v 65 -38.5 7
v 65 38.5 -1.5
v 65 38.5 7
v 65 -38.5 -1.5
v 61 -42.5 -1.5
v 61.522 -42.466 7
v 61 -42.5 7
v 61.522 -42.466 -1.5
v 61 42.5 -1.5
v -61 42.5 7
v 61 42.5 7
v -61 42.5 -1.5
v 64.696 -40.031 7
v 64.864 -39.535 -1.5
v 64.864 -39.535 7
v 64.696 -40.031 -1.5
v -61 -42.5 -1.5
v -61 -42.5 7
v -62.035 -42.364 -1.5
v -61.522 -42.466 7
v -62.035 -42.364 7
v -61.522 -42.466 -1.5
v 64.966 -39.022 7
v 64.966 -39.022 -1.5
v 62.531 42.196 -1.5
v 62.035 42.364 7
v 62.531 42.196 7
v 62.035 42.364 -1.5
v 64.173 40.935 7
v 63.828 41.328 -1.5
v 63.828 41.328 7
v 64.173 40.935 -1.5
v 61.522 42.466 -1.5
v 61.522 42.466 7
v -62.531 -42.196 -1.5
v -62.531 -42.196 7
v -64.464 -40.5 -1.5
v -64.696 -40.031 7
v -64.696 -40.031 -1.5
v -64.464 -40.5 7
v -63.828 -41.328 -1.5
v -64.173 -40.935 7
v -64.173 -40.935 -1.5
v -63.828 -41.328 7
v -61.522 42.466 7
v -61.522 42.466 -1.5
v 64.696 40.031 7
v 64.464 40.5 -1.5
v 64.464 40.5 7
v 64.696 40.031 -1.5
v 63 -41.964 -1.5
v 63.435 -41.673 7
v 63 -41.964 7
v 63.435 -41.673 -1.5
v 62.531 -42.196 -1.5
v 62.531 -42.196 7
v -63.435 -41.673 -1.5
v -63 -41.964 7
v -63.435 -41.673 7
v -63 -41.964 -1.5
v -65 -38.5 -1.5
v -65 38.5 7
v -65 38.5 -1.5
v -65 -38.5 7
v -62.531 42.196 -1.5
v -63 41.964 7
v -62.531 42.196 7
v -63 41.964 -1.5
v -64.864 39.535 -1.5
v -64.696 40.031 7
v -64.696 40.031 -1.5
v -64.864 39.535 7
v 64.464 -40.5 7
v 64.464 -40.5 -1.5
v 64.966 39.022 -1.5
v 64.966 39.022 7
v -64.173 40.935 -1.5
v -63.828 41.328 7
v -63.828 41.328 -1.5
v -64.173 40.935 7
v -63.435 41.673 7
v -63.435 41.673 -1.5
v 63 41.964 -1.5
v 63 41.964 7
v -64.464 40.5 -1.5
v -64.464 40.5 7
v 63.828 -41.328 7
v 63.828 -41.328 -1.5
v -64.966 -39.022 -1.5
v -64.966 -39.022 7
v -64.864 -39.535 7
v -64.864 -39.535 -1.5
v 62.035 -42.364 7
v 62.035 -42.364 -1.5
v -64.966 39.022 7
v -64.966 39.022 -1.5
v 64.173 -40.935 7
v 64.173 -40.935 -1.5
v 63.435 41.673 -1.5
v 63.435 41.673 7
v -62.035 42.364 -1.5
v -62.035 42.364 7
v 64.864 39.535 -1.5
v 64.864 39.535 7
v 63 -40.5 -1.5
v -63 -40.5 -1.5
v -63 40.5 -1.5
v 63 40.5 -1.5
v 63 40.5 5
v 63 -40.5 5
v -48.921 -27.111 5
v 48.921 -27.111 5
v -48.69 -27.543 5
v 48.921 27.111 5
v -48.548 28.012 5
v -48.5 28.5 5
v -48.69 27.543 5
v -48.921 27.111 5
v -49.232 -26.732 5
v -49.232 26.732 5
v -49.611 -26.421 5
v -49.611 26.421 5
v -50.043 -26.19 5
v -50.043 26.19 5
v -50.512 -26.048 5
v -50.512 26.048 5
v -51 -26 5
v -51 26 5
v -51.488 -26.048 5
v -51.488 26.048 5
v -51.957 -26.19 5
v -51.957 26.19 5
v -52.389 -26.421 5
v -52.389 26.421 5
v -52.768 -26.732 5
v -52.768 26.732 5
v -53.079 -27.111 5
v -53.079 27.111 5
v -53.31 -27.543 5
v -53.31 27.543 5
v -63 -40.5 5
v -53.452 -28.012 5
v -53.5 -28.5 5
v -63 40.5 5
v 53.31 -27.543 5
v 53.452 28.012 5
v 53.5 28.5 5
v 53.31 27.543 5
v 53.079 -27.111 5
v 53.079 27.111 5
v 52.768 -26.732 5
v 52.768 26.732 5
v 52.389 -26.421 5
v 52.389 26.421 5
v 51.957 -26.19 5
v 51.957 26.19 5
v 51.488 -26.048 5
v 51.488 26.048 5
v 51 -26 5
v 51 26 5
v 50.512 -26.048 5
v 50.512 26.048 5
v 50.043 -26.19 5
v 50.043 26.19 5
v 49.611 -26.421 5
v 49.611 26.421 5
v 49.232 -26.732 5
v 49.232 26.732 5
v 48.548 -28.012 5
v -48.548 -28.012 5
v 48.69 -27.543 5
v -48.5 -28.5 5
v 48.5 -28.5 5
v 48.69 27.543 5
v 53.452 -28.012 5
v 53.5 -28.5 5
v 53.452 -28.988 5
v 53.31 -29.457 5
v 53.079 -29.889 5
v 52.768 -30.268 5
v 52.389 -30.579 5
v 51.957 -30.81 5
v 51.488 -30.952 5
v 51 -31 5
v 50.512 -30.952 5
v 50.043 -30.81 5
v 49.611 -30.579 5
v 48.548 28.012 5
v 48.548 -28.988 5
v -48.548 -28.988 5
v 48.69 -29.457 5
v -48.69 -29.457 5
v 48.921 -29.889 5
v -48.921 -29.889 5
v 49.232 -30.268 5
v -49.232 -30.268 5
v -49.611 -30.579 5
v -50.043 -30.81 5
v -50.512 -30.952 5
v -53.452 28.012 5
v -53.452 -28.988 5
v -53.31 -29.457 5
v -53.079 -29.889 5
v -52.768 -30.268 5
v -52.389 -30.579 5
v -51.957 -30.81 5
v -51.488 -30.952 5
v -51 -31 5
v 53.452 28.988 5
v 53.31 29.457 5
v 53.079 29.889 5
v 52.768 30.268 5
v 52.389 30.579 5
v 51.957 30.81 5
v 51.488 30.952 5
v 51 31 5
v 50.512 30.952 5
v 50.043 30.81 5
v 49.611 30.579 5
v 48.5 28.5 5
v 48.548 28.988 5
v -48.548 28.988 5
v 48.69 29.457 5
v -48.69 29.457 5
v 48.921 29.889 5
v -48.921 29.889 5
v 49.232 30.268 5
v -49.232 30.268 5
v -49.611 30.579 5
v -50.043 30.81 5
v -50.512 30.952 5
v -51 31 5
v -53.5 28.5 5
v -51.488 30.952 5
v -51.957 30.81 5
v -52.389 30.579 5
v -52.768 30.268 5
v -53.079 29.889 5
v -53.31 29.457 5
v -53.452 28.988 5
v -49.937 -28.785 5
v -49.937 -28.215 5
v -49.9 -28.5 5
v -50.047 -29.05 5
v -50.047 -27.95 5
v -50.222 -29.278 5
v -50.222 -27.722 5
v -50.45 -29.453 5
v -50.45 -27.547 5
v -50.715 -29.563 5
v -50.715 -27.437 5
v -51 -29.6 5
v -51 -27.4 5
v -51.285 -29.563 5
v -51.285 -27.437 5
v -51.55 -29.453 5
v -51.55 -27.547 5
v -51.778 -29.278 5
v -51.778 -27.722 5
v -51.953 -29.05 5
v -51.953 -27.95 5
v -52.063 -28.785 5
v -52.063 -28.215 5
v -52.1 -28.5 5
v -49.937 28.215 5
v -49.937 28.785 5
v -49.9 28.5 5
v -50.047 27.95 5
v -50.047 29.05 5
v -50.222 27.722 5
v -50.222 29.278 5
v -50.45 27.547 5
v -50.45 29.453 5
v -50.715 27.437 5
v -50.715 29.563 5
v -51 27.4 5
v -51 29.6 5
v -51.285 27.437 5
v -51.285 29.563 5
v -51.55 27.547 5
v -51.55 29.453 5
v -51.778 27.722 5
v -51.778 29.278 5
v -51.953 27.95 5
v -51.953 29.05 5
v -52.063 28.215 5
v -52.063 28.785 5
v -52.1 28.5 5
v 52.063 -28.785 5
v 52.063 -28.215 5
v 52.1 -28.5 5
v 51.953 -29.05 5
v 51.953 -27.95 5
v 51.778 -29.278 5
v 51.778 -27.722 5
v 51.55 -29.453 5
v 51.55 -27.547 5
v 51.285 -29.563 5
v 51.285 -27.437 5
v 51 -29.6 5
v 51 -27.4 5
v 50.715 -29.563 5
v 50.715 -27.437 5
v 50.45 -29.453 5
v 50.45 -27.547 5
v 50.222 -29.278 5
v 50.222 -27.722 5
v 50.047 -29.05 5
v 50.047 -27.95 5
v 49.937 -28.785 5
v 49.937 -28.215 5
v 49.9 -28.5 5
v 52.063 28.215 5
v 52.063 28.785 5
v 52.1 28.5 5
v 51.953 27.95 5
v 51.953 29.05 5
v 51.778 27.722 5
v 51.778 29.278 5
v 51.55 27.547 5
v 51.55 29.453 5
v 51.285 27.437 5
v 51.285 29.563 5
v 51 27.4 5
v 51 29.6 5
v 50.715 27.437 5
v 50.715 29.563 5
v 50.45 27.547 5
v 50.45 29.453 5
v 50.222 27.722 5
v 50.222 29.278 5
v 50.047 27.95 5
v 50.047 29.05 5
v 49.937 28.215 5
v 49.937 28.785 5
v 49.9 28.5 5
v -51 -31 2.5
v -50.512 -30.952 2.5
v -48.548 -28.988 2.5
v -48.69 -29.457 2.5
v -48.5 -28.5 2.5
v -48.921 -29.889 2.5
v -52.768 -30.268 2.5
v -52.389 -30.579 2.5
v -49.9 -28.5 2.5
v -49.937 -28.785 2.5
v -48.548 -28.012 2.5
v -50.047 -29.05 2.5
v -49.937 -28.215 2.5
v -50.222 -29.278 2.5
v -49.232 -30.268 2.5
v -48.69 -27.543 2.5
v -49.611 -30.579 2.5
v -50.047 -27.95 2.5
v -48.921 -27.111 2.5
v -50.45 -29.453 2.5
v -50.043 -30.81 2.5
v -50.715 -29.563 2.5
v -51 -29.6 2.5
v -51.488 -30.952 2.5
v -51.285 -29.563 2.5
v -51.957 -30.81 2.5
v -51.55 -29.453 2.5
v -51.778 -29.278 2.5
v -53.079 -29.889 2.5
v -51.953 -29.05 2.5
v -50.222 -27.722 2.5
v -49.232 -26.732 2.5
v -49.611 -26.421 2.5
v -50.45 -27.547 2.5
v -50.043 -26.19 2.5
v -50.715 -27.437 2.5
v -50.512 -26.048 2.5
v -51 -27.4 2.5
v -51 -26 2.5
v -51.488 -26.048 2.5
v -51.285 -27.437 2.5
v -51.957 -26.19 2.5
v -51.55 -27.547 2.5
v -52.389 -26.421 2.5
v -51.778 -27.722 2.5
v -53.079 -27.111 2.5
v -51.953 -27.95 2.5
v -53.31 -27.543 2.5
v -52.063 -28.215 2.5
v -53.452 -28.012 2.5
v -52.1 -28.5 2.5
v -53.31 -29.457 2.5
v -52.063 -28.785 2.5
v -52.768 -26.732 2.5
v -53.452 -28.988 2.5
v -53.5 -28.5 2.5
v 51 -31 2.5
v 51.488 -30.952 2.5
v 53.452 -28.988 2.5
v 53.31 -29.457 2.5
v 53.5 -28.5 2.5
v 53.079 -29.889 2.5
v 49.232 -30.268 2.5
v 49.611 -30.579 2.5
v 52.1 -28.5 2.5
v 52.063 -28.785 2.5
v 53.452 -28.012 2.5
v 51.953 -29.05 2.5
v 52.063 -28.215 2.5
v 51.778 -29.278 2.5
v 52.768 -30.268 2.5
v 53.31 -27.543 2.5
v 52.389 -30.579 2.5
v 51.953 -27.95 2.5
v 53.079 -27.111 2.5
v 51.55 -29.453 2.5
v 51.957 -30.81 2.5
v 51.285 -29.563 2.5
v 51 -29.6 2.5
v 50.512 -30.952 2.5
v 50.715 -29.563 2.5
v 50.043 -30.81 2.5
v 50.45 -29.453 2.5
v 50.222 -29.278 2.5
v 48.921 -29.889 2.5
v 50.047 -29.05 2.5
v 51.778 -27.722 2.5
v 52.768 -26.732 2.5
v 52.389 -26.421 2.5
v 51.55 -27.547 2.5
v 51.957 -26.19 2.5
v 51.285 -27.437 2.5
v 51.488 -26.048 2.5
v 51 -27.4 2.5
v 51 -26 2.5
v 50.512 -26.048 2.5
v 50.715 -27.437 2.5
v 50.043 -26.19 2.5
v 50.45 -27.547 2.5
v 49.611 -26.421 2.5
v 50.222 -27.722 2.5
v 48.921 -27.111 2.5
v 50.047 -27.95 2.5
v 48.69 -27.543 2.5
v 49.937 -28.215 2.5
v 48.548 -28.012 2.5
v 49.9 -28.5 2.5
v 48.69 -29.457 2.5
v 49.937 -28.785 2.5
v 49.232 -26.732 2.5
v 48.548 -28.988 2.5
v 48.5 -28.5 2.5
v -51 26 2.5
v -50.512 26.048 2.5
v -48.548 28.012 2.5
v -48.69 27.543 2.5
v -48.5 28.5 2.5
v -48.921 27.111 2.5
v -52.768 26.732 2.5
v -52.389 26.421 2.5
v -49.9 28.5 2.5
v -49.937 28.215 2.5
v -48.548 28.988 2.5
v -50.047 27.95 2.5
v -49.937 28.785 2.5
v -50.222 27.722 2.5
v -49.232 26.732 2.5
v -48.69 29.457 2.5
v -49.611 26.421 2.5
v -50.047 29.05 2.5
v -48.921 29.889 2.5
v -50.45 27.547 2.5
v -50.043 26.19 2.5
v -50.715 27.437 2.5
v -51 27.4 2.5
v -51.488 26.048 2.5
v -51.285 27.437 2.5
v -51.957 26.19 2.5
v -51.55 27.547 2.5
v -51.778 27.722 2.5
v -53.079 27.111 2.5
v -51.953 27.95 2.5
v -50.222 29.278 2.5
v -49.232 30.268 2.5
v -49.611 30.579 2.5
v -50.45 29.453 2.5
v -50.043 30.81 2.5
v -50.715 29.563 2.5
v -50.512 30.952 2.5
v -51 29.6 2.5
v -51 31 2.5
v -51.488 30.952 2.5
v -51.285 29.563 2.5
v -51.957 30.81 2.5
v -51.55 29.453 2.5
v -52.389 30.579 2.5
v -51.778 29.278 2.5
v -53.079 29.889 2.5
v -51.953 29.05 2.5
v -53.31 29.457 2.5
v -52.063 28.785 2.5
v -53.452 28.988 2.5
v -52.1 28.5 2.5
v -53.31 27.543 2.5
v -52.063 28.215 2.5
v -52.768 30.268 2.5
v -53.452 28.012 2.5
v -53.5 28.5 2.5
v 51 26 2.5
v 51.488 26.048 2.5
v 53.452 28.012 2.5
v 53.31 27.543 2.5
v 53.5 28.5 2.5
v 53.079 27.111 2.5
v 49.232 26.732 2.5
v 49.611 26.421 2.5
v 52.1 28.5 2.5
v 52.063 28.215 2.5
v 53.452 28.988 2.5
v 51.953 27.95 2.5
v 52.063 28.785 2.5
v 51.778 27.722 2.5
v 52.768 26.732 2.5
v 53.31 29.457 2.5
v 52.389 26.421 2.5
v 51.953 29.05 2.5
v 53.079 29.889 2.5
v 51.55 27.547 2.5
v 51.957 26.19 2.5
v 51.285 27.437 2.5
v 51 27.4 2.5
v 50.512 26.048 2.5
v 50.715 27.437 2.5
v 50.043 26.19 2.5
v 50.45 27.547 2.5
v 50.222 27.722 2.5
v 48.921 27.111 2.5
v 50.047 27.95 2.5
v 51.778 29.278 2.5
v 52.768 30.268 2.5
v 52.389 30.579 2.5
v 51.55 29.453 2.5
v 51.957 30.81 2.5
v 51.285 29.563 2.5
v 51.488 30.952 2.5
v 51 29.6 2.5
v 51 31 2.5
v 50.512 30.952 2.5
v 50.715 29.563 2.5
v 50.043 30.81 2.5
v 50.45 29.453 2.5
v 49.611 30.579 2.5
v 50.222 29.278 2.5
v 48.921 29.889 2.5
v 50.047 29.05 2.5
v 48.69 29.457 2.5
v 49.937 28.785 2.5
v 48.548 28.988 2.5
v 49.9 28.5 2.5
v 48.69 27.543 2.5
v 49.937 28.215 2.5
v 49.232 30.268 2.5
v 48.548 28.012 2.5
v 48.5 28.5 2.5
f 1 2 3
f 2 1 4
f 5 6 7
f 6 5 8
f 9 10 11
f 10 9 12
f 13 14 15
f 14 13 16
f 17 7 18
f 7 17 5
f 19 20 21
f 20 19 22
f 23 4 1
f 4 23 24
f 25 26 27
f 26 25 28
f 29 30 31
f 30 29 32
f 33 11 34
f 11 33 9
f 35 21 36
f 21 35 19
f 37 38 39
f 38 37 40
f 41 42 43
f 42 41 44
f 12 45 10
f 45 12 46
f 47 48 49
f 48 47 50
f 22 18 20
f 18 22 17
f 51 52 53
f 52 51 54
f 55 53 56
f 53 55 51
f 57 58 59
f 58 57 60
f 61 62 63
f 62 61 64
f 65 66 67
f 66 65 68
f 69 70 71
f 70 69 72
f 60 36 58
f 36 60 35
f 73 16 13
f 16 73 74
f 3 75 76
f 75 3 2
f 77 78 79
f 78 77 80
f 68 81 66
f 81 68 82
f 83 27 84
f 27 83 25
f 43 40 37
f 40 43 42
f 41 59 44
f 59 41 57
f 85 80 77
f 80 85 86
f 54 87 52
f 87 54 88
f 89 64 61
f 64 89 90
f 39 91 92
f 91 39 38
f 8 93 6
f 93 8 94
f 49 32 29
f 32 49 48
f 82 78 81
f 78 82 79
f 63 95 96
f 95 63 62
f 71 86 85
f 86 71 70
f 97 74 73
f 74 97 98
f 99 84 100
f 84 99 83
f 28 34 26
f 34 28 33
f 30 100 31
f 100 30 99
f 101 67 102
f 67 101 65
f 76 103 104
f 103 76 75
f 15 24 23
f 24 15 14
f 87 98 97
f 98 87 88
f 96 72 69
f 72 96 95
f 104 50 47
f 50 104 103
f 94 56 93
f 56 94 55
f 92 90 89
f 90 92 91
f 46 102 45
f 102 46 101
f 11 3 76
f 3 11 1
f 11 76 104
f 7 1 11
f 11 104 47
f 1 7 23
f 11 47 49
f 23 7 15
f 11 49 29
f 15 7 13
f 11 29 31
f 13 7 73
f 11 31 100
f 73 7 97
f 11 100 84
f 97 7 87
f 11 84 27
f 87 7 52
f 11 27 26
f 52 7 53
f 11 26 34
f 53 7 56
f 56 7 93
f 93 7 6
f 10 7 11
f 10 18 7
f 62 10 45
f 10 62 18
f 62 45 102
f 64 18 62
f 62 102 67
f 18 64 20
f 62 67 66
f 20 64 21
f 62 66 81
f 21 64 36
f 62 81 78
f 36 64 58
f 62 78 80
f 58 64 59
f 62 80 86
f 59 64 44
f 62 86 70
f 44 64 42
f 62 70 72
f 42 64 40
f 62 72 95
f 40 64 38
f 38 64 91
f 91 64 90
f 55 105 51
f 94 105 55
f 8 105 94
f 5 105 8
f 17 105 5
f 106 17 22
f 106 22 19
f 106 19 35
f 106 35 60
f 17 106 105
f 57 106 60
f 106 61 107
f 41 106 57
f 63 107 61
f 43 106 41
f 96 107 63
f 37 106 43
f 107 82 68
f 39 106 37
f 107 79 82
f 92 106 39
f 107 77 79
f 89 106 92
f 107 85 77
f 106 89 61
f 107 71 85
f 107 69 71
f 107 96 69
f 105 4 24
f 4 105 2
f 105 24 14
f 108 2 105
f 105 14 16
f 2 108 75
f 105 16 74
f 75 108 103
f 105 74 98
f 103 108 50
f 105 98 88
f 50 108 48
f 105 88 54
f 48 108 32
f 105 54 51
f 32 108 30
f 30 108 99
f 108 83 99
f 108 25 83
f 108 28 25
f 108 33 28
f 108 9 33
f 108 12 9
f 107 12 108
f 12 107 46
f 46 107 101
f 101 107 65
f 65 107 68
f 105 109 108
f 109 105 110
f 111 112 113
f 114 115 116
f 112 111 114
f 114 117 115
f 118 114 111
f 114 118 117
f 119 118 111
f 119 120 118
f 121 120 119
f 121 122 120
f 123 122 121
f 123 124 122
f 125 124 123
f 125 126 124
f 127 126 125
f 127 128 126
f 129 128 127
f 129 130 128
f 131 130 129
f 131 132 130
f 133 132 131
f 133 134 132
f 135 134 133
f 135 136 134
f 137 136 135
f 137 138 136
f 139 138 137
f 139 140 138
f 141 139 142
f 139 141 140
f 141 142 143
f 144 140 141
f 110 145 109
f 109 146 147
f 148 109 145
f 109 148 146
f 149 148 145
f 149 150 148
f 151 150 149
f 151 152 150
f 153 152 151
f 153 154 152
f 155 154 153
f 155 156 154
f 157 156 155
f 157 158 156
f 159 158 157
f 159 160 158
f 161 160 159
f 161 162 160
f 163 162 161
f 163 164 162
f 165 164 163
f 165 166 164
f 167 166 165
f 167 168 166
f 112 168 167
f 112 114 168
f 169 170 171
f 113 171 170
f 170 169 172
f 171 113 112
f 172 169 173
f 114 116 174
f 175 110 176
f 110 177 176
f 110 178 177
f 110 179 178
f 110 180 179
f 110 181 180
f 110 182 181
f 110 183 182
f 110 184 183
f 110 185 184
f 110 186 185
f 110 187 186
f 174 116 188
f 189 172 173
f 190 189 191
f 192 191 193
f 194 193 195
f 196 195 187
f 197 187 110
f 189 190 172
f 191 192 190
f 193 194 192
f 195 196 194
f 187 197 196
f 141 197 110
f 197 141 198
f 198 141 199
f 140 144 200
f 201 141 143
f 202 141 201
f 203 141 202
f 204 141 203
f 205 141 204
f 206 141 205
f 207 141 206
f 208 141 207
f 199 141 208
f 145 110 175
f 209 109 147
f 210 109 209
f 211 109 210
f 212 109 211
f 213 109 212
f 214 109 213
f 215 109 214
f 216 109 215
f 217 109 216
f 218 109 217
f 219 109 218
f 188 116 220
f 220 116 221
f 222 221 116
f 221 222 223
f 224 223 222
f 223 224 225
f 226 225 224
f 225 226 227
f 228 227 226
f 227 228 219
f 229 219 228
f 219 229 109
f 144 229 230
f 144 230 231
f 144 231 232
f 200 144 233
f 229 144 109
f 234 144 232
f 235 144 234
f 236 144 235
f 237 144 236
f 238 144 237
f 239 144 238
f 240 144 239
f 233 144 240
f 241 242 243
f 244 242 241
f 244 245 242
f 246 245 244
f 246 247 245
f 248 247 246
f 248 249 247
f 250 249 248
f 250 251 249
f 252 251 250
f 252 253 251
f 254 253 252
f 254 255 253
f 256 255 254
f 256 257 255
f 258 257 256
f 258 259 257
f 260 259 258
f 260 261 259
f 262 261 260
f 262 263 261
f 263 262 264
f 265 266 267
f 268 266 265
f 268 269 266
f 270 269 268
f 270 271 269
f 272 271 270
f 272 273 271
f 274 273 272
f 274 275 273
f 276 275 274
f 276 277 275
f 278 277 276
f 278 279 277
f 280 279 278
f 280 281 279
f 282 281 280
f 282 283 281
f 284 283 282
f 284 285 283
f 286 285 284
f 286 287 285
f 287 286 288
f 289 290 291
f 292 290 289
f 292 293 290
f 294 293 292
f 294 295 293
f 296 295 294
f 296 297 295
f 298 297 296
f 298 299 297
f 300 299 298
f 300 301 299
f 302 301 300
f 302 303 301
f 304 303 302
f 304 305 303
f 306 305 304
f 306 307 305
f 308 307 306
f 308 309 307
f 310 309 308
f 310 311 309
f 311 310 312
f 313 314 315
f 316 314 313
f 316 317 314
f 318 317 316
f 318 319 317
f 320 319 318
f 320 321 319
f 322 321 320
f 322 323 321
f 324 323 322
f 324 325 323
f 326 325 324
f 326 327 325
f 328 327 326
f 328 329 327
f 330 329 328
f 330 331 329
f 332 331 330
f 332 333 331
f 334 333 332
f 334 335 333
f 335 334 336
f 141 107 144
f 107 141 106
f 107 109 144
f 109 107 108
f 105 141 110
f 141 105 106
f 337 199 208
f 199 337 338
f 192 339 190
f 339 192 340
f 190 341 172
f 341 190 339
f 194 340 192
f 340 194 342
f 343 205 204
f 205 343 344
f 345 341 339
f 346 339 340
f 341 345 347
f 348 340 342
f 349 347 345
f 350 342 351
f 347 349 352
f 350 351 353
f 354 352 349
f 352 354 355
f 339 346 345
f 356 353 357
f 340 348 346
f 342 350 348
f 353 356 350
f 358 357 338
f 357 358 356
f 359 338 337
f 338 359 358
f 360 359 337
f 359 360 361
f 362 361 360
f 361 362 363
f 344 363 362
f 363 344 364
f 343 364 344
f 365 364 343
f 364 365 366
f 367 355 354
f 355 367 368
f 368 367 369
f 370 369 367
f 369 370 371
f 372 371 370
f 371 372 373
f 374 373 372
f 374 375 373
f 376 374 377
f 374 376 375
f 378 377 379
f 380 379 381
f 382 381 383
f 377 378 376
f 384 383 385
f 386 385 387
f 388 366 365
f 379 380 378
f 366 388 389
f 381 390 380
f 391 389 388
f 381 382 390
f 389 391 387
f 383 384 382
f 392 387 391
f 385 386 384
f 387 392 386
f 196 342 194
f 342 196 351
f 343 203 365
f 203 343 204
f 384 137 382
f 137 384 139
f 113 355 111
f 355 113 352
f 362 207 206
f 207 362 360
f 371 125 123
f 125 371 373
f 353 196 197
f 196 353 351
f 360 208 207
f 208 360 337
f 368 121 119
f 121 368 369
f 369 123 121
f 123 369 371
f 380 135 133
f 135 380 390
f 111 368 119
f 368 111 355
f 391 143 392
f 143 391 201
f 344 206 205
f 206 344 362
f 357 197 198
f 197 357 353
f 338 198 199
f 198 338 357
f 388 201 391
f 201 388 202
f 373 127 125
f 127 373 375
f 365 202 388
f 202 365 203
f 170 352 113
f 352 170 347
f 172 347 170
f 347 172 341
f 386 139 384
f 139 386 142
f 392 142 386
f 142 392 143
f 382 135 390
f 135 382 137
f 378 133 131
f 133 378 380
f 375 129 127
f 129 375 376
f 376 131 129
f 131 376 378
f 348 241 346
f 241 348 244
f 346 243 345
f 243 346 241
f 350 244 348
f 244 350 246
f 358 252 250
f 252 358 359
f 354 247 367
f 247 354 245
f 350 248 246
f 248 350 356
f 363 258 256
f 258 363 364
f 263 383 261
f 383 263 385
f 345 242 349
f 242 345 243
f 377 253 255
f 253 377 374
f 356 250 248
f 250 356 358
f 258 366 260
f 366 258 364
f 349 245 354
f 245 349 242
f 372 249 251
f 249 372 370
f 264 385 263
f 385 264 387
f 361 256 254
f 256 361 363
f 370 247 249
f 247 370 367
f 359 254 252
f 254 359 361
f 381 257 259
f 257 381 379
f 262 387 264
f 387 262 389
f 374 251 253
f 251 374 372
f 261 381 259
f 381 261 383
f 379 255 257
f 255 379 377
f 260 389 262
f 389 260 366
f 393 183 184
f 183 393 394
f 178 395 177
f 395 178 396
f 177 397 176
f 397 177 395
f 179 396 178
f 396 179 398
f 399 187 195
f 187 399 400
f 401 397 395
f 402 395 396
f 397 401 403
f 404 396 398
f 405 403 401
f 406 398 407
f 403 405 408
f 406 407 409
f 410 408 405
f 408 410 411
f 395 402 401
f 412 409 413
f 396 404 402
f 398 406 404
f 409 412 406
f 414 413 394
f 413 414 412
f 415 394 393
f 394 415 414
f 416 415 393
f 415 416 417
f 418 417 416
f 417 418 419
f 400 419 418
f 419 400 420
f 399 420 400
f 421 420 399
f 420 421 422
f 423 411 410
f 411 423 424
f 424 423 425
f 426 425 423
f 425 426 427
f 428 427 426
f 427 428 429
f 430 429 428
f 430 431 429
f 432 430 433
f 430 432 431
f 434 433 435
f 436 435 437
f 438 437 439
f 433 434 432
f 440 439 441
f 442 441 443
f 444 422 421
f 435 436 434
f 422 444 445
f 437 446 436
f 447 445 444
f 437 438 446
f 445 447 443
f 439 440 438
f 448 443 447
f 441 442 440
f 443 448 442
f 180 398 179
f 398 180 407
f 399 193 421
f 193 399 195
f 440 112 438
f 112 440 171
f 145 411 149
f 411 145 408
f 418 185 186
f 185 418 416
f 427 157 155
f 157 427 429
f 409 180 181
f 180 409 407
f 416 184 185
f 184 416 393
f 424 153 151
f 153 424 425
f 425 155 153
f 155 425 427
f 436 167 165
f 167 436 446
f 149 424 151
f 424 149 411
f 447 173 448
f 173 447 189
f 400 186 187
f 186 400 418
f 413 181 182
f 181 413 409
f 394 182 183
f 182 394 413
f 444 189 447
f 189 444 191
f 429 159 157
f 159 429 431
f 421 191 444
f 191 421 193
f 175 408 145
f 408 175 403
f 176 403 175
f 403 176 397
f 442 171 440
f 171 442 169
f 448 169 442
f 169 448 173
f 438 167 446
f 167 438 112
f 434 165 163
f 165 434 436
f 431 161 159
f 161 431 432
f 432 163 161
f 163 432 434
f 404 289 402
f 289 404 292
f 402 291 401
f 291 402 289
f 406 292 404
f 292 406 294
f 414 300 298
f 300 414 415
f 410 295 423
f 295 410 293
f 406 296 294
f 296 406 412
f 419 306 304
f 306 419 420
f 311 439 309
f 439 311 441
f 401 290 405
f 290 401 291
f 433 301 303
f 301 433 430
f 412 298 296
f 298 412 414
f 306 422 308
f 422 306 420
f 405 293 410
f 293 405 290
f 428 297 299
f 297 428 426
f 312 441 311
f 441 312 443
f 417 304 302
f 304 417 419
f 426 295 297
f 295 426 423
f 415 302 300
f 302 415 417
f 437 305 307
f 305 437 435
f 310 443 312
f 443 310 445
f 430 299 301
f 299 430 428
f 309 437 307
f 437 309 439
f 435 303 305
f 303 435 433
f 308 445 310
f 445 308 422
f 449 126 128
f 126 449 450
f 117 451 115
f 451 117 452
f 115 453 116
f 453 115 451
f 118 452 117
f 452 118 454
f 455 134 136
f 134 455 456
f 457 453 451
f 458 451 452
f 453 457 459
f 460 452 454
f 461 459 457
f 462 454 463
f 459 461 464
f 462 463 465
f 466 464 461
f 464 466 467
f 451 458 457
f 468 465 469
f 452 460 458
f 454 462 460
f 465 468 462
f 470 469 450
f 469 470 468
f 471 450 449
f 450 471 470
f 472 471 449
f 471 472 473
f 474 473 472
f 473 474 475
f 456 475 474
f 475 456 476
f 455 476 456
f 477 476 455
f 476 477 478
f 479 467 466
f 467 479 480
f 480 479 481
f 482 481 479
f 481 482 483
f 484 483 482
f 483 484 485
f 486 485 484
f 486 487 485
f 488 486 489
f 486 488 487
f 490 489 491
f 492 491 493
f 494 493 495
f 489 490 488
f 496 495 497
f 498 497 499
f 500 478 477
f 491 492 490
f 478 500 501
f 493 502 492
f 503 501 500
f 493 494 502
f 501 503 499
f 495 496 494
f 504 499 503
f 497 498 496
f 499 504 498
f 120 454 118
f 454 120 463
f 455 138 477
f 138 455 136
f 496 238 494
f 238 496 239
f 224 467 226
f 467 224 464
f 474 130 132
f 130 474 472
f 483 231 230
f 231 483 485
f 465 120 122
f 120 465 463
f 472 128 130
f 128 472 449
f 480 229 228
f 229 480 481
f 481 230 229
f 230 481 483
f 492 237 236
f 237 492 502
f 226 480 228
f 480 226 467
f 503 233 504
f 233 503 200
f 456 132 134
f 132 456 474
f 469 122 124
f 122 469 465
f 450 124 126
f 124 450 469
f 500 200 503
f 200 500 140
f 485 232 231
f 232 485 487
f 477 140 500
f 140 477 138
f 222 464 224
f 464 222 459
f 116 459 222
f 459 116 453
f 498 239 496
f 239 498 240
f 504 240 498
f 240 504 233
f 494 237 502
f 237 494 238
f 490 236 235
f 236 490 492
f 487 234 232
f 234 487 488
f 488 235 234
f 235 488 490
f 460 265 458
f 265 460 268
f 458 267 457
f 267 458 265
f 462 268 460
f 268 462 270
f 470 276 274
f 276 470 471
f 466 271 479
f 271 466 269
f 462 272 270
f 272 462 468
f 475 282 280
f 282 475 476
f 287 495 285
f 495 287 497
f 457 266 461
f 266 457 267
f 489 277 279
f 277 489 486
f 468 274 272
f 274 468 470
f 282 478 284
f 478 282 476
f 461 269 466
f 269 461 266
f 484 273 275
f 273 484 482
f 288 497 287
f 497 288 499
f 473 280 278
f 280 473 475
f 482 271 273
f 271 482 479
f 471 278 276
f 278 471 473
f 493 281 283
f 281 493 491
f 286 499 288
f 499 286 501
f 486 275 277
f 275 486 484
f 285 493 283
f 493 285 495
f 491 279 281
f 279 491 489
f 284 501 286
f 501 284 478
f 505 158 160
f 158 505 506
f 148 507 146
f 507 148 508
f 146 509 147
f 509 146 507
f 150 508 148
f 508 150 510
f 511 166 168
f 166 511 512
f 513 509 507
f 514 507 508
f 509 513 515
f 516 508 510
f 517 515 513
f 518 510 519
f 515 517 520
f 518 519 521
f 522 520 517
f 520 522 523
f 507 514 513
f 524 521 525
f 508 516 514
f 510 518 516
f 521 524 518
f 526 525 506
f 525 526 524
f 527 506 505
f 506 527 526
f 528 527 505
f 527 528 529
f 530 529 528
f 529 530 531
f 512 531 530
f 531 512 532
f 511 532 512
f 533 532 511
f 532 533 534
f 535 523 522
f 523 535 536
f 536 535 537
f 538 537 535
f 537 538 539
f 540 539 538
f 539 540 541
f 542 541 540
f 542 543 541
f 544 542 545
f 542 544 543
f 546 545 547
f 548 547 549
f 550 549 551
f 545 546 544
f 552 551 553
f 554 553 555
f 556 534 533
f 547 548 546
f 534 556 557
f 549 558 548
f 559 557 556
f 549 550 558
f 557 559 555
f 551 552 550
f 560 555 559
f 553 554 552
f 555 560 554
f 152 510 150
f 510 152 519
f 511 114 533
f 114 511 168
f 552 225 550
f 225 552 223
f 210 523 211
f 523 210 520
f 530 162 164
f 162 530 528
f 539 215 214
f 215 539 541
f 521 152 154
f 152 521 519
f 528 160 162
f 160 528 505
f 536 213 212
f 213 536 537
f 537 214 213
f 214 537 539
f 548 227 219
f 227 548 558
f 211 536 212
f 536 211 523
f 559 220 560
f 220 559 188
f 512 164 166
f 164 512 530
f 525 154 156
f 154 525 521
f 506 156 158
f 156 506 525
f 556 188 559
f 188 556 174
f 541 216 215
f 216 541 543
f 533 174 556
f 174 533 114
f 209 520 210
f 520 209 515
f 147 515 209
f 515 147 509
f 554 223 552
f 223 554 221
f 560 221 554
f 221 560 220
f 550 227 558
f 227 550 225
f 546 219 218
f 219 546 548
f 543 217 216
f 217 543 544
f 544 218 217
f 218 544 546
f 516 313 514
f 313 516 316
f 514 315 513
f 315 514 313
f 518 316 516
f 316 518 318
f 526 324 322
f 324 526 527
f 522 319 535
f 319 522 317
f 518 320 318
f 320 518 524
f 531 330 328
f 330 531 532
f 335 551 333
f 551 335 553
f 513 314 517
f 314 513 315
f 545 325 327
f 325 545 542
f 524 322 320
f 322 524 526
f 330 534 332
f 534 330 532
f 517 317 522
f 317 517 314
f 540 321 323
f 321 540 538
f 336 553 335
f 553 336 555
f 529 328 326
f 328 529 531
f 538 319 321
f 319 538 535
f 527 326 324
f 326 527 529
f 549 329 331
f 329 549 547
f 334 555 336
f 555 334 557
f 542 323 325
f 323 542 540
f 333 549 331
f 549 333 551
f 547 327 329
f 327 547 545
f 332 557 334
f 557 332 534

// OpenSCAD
union() {
	difference() {
		difference() {
			intersection() {
				hull() {
					translate(v = [-61.0, -38.5, 0]) {
						cylinder($fn = 48, center = true, h = 14.0, r = 4.0);
					}
					translate(v = [-61.0, 38.5, 0]) {
						cylinder($fn = 48, center = true, h = 14.0, r = 4.0);
					}
					translate(v = [61.0, -38.5, 0]) {
						cylinder($fn = 48, center = true, h = 14.0, r = 4.0);
					}
					translate(v = [61.0, 38.5, 0]) {
						cylinder($fn = 48, center = true, h = 14.0, r = 4.0);
					}
				}
				translate(v = [0, 0, 2.75]) {
					cube(center = true, size = [132.0, 87.0, 8.5]);
				}
			}
			translate(v = [0, 0, -2.3]) {
				difference() {
					hull() {
						translate(v = [-61.099999999999994, -38.6, 0]) {
							cylinder($fn = 48, center = true, h = 1.6, r = 3.2);
						}
						translate(v = [-61.099999999999994, 38.6, 0]) {
							cylinder($fn = 48, center = true, h = 1.6, r = 3.2);
						}
						translate(v = [61.099999999999994, -38.6, 0]) {
							cylinder($fn = 48, center = true, h = 1.6, r = 3.2);
						}
						translate(v = [61.099999999999994, 38.6, 0]) {
							cylinder($fn = 48, center = true, h = 1.6, r = 3.2);
						}
					}
					hull() {
						translate(v = [-60.9, -38.4, 0]) {
							cylinder($fn = 48, center = true, h = 1.8, r = 0.7999999999999998);
						}
						translate(v = [-60.9, 38.4, 0]) {
							cylinder($fn = 48, center = true, h = 1.8, r = 0.7999999999999998);
						}
						translate(v = [60.9, -38.4, 0]) {
							cylinder($fn = 48, center = true, h = 1.8, r = 0.7999999999999998);
						}
						translate(v = [60.9, 38.4, 0]) {
							cylinder($fn = 48, center = true, h = 1.8, r = 0.7999999999999998);
						}
					}
				}
			}
		}
		cube(center = true, size = [126.0, 81.0, 10.0]);
	}
	union() {
		translate(v = [-51.0, -28.5, 5.0]) {
			rotate(a = [180, 0, 0]) {
				difference() {
					cylinder($fn = 32, center = false, d = 5.0, h = 2.5);
					translate(v = [0, 0, -0.1]) {
						cylinder($fn = 24, center = false, d = 2.2, h = 2.7);
					}
				}
			}
		}
		translate(v = [51.0, -28.5, 5.0]) {
			rotate(a = [180, 0, 0]) {
				difference() {
					cylinder($fn = 32, center = false, d = 5.0, h = 2.5);
					translate(v = [0, 0, -0.1]) {
						cylinder($fn = 24, center = false, d = 2.2, h = 2.7);
					}
				}
			}
		}
		translate(v = [-51.0, 28.5, 5.0]) {
			rotate(a = [180, 0, 0]) {
				difference() {
					cylinder($fn = 32, center = false, d = 5.0, h = 2.5);
					translate(v = [0, 0, -0.1]) {
						cylinder($fn = 24, center = false, d = 2.2, h = 2.7);
					}
				}
			}
		}
		translate(v = [51.0, 28.5, 5.0]) {
			rotate(a = [180, 0, 0]) {
				difference() {
					cylinder($fn = 32, center = false, d = 5.0, h = 2.5);
					translate(v = [0, 0, -0.1]) {
						cylinder($fn = 24, center = false, d = 2.2, h = 2.7);
					}
				}
			}
		}
	}
}
